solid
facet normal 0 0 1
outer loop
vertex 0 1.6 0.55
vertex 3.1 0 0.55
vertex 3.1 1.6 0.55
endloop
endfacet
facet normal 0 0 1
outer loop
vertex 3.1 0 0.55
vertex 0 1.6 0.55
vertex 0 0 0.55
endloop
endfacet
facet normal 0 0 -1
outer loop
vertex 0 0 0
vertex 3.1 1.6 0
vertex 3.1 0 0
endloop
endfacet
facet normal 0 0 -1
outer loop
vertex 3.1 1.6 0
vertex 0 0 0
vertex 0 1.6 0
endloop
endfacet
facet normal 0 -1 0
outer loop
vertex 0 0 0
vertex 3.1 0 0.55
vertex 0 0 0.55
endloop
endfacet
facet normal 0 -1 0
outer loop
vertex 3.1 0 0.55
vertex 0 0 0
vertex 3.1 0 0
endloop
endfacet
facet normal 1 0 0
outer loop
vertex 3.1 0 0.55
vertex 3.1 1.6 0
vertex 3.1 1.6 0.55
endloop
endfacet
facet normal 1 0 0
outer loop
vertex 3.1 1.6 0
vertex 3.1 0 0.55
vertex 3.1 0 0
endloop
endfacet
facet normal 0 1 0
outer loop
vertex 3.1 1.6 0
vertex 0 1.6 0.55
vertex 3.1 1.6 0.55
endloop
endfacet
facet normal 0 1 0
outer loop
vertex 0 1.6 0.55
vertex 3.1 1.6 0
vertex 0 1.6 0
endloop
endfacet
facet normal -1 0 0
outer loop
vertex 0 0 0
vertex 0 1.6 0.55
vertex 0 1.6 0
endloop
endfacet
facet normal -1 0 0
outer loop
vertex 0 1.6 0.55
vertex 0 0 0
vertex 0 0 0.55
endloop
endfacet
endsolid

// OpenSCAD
// smd resistors

// types are
//		0	0402 / 1005
//		1	0603 / 1608
//		2	0805 / 2012
//		3	1206 / 3216
//		4	1210 / 3225
//		5	2010 / 5025
//		6	2512 / 6332

l	= [1.0, 1.6, 2.1, 3.1, 3.1, 5.0, 6.35];
w	= [0.5, 0.85, 1.3, 1.6, 2.6, 2.5, 3.2];
h	= [0.35, 0.45, 0.5, 0.55, 0.55, 0.55, 0.55];
d	= [0.25, 0.3, 0.4, 0.5, 0.4, 0.4, 0.4];
t	= [0.2, 0.3, 0.4, 0.5, 0.5, 0.6, 0.6];

module smd(type){
	cube( [ l[type], w[type], h[type] ] );
}

smd(3);
